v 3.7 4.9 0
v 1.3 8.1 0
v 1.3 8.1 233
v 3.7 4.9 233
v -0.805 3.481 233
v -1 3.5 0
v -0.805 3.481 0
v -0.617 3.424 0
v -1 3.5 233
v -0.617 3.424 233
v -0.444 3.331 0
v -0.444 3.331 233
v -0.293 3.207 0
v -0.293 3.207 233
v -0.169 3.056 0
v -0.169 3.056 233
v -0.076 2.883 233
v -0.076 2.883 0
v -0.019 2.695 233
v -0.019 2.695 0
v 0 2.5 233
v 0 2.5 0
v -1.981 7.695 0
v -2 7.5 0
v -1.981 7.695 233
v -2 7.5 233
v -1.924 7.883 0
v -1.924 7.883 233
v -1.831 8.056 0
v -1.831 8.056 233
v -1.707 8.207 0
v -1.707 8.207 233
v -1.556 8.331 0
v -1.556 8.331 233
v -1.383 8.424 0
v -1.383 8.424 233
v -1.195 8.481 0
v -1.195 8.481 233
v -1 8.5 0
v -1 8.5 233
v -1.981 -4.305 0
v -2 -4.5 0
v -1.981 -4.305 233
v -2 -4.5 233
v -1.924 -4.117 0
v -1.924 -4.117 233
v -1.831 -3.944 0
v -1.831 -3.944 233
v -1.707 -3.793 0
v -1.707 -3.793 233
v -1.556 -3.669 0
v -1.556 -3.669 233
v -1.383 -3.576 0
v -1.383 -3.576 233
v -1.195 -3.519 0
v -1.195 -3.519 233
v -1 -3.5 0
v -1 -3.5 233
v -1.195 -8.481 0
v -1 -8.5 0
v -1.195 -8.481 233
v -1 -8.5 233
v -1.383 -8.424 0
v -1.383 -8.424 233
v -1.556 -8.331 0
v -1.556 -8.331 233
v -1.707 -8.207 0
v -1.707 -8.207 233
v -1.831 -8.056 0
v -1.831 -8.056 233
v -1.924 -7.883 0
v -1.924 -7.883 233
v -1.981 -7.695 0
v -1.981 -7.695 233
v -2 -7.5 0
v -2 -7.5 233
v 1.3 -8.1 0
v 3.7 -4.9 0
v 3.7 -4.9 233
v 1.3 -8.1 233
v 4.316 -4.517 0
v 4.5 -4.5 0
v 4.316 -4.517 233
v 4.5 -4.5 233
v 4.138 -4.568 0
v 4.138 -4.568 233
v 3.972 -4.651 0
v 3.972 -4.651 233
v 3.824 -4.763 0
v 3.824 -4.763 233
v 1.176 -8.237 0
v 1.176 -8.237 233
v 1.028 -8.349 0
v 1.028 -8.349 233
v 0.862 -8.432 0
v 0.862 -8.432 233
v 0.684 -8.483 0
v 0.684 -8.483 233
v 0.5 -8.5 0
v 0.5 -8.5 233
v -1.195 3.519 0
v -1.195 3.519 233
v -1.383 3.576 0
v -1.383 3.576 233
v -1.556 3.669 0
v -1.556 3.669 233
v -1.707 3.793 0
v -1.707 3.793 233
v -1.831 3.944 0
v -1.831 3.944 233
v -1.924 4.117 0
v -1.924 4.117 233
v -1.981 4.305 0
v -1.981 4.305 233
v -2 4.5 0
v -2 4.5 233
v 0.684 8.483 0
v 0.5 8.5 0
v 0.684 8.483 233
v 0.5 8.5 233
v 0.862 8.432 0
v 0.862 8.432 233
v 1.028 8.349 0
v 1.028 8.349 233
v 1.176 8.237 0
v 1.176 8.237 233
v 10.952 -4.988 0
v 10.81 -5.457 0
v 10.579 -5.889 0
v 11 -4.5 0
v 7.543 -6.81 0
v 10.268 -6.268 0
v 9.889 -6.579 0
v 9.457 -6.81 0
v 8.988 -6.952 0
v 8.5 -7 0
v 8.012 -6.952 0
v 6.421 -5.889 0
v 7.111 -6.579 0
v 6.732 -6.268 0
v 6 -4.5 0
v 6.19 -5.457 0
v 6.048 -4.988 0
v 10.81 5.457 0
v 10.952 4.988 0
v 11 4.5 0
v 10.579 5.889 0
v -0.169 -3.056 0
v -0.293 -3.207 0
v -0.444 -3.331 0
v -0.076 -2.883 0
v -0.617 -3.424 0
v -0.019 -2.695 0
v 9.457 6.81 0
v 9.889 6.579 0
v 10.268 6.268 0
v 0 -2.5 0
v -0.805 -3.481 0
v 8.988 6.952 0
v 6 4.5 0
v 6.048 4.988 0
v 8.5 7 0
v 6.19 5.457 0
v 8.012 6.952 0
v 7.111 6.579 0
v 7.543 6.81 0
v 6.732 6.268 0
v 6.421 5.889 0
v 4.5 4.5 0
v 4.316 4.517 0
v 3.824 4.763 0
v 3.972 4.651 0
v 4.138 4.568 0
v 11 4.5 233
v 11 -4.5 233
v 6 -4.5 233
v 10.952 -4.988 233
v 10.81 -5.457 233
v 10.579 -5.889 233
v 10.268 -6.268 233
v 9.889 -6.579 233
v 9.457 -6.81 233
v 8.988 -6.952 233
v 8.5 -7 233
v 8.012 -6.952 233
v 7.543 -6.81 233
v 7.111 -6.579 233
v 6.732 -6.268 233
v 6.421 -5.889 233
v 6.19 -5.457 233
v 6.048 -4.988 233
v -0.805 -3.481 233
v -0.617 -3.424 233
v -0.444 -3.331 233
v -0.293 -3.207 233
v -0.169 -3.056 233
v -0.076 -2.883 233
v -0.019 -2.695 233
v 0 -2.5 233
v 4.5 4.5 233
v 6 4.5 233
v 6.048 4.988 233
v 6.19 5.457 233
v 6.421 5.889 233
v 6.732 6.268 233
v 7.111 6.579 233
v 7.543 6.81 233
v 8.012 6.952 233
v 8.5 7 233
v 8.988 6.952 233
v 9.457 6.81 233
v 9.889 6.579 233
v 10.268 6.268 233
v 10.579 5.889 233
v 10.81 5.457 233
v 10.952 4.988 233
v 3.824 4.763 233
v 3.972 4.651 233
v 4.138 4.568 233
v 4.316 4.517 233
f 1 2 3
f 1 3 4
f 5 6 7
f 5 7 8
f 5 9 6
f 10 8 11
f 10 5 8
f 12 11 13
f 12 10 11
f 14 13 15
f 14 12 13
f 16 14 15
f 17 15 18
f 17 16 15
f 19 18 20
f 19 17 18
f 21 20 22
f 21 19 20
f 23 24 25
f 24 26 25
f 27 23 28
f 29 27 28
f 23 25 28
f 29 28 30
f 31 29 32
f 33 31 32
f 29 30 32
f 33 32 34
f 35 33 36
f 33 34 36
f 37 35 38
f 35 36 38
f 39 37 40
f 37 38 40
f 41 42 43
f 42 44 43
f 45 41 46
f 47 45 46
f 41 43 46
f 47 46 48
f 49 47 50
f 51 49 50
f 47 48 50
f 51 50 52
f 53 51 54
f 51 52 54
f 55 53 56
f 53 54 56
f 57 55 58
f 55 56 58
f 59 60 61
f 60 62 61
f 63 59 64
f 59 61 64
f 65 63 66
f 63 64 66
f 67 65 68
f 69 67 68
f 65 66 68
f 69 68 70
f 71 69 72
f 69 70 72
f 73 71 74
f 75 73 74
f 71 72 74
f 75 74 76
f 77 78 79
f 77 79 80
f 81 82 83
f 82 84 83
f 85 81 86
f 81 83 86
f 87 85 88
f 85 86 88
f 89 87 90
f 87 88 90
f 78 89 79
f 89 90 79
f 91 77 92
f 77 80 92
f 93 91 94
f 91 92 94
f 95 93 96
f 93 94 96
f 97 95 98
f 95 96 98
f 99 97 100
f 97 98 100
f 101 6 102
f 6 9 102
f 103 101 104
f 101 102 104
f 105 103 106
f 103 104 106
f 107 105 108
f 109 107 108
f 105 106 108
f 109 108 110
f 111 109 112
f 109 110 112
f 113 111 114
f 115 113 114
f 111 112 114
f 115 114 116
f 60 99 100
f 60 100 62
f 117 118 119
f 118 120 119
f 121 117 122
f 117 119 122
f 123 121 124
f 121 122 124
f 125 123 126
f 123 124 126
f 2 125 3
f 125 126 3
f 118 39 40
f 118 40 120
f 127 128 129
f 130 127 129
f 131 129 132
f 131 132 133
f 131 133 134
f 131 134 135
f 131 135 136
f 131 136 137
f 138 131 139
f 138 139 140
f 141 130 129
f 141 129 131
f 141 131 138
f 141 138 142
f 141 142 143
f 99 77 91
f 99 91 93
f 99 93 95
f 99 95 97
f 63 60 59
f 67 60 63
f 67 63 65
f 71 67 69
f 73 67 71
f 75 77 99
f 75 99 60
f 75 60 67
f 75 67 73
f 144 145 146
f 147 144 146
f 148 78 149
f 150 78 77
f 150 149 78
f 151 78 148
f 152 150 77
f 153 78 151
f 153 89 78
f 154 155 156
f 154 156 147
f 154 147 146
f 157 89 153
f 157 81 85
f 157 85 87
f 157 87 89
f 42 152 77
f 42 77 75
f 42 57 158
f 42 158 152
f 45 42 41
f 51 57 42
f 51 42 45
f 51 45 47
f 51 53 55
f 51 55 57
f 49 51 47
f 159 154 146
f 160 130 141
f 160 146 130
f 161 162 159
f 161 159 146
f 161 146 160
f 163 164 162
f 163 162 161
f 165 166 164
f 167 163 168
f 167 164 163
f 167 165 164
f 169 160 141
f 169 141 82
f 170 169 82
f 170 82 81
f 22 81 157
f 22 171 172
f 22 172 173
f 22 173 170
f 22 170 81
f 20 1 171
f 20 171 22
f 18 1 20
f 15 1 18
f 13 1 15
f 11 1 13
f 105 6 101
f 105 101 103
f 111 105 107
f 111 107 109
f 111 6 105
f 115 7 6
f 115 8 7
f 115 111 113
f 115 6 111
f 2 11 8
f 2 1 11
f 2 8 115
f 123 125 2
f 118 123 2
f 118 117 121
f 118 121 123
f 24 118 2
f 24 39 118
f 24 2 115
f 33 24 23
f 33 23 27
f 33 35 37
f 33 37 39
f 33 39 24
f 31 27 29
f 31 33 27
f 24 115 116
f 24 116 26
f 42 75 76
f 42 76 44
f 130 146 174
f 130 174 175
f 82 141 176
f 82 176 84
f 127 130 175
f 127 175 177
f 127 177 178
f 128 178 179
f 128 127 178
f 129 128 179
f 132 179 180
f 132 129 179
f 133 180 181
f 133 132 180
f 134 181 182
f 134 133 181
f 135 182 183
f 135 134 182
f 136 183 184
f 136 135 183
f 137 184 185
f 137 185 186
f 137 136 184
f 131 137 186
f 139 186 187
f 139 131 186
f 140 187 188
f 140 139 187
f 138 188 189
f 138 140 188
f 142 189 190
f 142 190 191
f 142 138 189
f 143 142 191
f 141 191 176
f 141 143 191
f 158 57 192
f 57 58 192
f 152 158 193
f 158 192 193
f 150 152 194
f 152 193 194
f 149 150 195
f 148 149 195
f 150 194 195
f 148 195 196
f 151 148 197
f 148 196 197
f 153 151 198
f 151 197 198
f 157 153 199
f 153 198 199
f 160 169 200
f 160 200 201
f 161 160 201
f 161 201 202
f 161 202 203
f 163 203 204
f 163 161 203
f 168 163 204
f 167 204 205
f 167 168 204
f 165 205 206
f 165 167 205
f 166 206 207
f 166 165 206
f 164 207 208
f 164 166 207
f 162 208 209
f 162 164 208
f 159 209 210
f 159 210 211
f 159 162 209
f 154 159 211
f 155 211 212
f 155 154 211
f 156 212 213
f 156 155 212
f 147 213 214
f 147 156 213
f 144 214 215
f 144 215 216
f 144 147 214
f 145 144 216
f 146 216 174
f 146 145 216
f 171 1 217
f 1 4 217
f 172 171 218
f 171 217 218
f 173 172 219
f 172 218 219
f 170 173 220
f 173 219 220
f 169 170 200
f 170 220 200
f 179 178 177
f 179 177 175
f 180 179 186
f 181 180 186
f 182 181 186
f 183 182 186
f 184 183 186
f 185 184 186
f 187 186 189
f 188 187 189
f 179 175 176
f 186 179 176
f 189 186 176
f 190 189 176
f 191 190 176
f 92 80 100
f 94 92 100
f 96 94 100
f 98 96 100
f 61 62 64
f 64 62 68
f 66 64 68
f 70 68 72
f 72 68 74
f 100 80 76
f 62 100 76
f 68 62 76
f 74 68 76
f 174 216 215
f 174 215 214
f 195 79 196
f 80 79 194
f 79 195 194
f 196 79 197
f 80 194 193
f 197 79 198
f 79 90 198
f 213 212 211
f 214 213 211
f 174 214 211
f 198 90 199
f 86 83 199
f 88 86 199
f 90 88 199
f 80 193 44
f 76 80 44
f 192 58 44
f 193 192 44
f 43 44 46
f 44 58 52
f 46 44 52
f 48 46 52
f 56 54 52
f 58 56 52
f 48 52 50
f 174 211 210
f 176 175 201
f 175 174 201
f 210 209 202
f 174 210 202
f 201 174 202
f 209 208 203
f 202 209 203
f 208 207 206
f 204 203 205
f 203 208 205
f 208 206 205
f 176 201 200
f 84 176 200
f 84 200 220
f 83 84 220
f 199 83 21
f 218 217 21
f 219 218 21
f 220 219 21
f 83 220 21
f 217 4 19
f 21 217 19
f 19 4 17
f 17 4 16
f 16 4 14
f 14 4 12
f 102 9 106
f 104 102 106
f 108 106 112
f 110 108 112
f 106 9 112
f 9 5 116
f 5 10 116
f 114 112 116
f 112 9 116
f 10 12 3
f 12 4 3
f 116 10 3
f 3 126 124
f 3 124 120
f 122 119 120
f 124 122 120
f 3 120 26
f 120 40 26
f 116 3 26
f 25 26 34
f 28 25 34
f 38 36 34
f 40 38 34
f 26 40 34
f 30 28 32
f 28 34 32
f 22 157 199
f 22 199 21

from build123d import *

# Parameters (mm, degrees)
BOSS_EXTRUDE1_DEPTH = 233
FILLET1_R           = 1


with BuildPart() as part:
    # Sketch1 → Boss-Extrude1 (new body)
    with BuildSketch(Plane.XY):
        with BuildLine():
            Line((0, 0), (0, 3.5))
            Line((0, 3.5), (-2, 3.5))
            Line((-2, 3.5), (-2, 8.5))
            Line((-2, 8.5), (1, 8.5))
            Line((1, 8.5), (4, 4.5))
            Line((4, 4.5), (6, 4.5))
            ThreePointArc((6, 4.5), (8.5, 7), (11, 4.5))
            Line((11, 4.5), (11, 0))
            Line((11, 0), (11, -4.5))
            ThreePointArc((11, -4.5), (8.5, -7), (6, -4.5))
            Line((6, -4.5), (4, -4.5))
            Line((4, -4.5), (1, -8.5))
            Line((1, -8.5), (-2, -8.5))
            Line((-2, -8.5), (-2, -3.5))
            Line((-2, -3.5), (0, -3.5))
            Line((0, -3.5), (0, 0))
        make_face()
    extrude(amount=BOSS_EXTRUDE1_DEPTH)

    # Fillet1
    fillet1_edges = [part.edges().sort_by_distance(p)[0] for p in [
        (4, -4.5, 116.5),
        (1, -8.5, 116.5),
        (-2, -8.5, 116.5),
        (-2, -3.5, 116.5),
        (0, -3.5, 116.5),
        (0, 3.5, 116.5),
        (-2, 3.5, 116.5),
        (-2, 8.5, 116.5),
        (1, 8.5, 116.5),
        (4, 4.5, 116.5),
    ]]
    fillet(fillet1_edges, radius=FILLET1_R - 0.0001)  # a hair under: the kernel refuses the full size


solid = part.part
